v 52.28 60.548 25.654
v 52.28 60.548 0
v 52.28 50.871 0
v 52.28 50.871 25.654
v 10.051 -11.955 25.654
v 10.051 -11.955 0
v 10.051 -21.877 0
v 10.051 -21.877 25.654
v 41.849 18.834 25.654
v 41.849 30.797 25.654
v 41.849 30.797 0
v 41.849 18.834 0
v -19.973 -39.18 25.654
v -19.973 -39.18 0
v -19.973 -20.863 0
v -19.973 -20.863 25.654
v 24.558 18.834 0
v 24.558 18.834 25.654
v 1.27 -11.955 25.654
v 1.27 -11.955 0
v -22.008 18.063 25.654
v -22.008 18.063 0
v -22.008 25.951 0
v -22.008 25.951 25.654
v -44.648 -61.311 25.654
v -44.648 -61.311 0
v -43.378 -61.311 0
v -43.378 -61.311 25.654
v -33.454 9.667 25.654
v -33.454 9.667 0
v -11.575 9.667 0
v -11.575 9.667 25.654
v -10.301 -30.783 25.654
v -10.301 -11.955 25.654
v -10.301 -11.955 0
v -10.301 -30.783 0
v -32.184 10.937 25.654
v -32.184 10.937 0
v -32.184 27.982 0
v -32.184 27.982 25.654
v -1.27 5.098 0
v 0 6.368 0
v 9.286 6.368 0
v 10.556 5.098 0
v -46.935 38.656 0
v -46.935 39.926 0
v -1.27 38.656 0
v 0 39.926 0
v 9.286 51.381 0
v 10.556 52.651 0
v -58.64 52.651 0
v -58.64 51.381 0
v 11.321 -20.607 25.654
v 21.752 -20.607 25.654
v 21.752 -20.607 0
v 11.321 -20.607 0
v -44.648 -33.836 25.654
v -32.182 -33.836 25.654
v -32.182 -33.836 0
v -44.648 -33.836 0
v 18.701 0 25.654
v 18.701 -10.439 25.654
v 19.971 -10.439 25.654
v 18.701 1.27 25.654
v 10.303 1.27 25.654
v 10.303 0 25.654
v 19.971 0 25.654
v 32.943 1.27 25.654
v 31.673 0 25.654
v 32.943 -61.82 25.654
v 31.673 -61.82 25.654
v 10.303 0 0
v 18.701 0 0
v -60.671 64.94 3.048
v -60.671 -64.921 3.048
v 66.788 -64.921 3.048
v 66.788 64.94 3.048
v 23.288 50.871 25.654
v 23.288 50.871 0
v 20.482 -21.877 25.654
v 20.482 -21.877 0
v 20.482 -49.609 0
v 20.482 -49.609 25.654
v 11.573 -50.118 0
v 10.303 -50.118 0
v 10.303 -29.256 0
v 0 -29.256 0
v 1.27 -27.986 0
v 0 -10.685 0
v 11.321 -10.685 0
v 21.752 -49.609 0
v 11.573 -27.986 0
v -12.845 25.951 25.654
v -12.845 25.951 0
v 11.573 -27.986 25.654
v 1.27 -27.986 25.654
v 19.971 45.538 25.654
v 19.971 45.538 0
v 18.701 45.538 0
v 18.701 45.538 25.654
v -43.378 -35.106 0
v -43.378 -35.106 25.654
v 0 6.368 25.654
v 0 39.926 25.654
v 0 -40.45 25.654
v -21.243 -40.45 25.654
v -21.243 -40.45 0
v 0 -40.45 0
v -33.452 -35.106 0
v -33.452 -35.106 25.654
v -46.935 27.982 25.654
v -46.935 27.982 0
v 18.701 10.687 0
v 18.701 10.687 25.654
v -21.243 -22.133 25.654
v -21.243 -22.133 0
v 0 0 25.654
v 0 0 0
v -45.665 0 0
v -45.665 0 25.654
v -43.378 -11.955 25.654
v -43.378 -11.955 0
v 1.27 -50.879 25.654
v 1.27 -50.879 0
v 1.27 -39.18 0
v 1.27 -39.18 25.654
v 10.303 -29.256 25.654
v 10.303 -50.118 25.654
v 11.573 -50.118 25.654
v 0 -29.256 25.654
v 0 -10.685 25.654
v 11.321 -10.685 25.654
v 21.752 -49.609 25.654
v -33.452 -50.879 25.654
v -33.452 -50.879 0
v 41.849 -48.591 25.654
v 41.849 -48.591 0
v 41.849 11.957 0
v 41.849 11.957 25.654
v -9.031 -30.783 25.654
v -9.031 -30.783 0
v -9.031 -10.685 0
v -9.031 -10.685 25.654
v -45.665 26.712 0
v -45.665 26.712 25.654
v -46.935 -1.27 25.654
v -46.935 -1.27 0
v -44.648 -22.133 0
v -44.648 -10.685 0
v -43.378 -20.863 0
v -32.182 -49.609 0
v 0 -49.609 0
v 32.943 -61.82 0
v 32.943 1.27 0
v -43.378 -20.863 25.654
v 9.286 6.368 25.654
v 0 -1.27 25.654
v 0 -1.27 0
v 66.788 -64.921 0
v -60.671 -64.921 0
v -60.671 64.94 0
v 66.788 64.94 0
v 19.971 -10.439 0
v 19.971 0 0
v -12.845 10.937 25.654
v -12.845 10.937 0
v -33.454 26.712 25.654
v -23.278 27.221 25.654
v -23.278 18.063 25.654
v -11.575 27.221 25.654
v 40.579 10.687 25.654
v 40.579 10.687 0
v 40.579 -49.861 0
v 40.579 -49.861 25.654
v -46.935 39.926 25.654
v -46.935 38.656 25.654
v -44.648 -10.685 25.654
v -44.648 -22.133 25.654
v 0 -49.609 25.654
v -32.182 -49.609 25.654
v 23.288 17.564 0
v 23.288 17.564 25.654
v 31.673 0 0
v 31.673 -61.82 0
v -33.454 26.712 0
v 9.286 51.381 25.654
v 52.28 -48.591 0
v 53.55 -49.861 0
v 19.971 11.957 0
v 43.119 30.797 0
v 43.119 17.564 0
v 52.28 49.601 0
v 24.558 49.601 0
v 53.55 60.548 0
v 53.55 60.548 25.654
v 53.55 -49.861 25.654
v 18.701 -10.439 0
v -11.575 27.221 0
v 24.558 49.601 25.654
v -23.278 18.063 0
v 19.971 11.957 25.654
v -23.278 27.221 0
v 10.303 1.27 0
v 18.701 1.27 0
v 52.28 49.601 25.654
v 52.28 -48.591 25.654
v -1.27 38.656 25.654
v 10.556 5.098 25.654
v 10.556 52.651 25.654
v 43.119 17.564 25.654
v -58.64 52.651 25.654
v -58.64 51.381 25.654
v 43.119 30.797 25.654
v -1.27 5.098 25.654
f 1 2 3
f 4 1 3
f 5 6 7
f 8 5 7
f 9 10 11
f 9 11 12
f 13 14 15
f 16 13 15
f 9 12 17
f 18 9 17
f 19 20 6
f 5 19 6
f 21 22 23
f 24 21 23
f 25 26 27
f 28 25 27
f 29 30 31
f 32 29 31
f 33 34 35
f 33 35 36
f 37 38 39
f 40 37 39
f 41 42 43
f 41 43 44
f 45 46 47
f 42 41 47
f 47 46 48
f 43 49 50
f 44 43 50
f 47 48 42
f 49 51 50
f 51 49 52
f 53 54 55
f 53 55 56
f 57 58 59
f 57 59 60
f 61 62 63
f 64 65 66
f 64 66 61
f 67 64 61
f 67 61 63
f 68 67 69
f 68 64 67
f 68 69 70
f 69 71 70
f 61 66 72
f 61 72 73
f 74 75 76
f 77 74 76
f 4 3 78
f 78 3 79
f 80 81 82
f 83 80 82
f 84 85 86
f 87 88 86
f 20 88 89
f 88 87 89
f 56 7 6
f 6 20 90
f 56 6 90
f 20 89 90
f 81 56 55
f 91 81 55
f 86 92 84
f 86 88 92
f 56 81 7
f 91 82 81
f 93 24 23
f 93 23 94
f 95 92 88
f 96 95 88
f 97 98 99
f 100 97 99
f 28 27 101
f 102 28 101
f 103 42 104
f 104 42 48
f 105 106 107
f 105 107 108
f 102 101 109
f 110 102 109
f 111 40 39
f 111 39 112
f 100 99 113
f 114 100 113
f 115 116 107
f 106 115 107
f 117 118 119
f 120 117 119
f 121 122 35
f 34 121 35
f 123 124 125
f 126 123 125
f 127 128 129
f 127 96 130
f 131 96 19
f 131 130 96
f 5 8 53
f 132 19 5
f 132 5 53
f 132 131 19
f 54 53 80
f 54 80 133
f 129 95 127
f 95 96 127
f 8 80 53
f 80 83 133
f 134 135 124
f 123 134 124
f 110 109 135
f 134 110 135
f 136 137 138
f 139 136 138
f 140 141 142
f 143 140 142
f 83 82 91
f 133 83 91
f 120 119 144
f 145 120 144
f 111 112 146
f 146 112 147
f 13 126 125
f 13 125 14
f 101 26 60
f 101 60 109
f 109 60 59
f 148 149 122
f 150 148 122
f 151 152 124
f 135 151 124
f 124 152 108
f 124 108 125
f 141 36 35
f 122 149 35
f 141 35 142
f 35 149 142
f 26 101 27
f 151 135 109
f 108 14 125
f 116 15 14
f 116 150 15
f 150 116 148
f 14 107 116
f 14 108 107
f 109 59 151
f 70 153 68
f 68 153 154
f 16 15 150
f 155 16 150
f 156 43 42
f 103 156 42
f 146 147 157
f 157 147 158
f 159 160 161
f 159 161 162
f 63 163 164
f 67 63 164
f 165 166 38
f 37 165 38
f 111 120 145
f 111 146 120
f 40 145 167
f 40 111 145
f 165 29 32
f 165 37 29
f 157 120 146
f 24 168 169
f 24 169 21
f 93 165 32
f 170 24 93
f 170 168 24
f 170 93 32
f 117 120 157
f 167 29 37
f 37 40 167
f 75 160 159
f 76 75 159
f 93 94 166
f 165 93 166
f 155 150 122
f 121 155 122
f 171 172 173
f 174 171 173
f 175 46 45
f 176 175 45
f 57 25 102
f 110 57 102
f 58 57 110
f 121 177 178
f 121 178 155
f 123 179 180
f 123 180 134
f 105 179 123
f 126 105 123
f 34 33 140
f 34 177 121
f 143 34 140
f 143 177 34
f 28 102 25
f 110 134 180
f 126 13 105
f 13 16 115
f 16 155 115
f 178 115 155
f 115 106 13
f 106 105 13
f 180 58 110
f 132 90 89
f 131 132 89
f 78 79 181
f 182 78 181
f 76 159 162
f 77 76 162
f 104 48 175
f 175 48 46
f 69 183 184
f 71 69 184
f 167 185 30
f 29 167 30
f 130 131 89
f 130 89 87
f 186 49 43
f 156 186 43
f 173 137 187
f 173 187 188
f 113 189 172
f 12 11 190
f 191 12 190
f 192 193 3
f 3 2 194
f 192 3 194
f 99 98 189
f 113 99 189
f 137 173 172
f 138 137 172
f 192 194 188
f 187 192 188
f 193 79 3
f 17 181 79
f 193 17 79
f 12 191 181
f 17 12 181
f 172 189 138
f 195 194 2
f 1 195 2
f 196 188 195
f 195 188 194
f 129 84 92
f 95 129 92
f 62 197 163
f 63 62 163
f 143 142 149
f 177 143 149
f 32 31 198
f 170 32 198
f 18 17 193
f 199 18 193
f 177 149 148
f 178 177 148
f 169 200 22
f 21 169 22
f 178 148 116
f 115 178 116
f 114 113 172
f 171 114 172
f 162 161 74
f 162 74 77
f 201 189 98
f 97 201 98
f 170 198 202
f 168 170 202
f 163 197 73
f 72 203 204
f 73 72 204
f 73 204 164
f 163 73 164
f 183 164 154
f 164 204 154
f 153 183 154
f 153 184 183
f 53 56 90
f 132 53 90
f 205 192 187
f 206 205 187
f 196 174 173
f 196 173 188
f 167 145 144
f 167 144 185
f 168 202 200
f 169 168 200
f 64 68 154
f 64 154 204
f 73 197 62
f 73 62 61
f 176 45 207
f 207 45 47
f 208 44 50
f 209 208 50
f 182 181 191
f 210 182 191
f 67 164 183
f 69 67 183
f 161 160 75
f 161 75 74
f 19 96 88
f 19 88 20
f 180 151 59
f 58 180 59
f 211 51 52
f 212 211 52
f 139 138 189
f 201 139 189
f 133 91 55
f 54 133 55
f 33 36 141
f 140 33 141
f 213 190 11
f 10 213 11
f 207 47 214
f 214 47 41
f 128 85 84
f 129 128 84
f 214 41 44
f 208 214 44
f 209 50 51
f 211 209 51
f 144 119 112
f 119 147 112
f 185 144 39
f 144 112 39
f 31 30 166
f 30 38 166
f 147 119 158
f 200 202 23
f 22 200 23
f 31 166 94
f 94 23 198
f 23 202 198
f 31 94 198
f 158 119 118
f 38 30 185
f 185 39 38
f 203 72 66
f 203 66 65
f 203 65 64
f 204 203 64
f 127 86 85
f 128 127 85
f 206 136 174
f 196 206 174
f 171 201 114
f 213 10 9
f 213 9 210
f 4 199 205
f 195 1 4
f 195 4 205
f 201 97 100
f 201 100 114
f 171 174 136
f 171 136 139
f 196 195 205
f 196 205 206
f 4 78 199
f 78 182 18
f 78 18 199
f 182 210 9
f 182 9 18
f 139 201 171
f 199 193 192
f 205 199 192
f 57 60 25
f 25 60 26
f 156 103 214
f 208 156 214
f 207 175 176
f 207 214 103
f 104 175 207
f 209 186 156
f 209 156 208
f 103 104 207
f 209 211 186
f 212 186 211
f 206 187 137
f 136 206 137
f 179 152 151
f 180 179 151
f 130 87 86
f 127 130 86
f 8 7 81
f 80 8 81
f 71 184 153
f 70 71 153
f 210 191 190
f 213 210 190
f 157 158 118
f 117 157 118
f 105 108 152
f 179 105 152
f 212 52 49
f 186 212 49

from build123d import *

# Parameters (mm, degrees)
F1_DEPTH = 25.654
F0_W     = 1.2699998915
F0_H     = 10.4394
F0_W_2   = 8.3973463625
F0_H_2   = 1.27
F2_W     = 127.459269017
F2_H     = 129.8603862524
F3_DEPTH = 3.048


# Not quite as in the source:
# - ends of sketch curves that miss each other by under 0.0002 mm in the source are joined
# - the program builds the solid bodies; features that only make, move or delete a surface that nothing else refers to are left out


with BuildPart() as f1:
    # F0 (on Top) → F1 (new body)
    with BuildSketch(Plane.XY):
        Polygon((-44.6478687227, -33.835709095), (-44.6478687227, -61.3113231957), (-43.3778688312, -61.3113231957), (-43.3778688312, -35.1057089865), (-33.4520824254, -35.1057089865), (-33.4520824254, -50.8787445724), (1.2699998915, -50.8787445724), (1.2699998915, -39.1802079976), (-19.9727192521, -39.1802079976), (-19.9727192521, -20.8631325513), (-43.3778688312, -20.8631325513), (-43.3778688312, -11.9549604133), (-10.3013357148, -11.9549604133), (-10.3013357148, -30.7828616351), (-9.0313358232, -30.7828616351), (-9.0313358232, -10.6849605218), (-44.6478687227, -10.6849605218), (-44.6478687227, -22.1331324428), (-21.2427191436, -22.1331324428), (-21.2427191436, -40.4502078891), (0, -40.4502078891), (0, -49.6087446809), (-32.1820825338, -49.6087446809), (-32.1820825338, -33.835709095), align=None)
    extrude(amount=F1_DEPTH)


with BuildPart() as f1b:
    # F0 (on Top) → F1, piece 2 (new body)
    with BuildSketch(Plane.XY):
        Polygon((0, -1.2699998915), (0, 0), (-45.6654839218, 0), (-45.6654839218, 26.7124027014), (-33.4541015327, 26.7124027014), (-33.4541015327, 9.6673453227), (-11.575373821, 9.6673453227), (-11.575373821, 27.2212084383), (-23.2779495418, 27.2212084383), (-23.2779495418, 18.0626716465), (-22.0079496503, 18.0626716465), (-22.0079496503, 25.9512085468), (-12.8453737125, 25.9512085468), (-12.8453737125, 10.9373452142), (-32.1841016412, 10.9373452142), (-32.1841016412, 27.9824025929), (-46.9354838133, 27.9824025929), (-46.9354838133, -1.2699998915), align=None)
    extrude(amount=F1_DEPTH)


with BuildPart() as f1c:
    # F0 (on Top) → F1, piece 3 (new body)
    with BuildSketch(Plane.XY):
        Polygon((0, 6.3681719211), (0, 39.9264097214), (-46.9354838133, 39.9264097214), (-46.9354838133, 38.6564097214), (-1.27, 38.6564097214), (-1.27, 5.0981719211), (10.555739623, 5.0981719211), (10.555739623, 52.6514952838), (-46.670460377, 52.6514952838), (-58.6400814354, 52.6514952838), (-58.6400814354, 52.2722989818), (-58.6400814354, 51.3814952838), (-46.670460377, 51.3814952838), (9.285739623, 51.3814952838), (9.285739623, 6.3681719211), align=None)
    extrude(amount=F1_DEPTH)


with BuildPart() as f1d:
    # F0 (on Top) → F1, piece 4 (new body)
    with BuildSketch(Plane.XY):
        Polygon((31.6732786596, -10.4394), (31.6732786596, -49.6087446809), (31.6732786596, -61.82012707), (32.9432785511, -61.82012707), (32.9432785511, -49.6087446809), (32.9432785511, -10.4394), (32.9432785511, 1.2699998915), (19.9707001448, 1.2699998915), (18.7007002532, 1.2699998915), (18.7007002532, 0), (19.9707001448, 0), (31.6732786596, 0), align=None)
        with Locations((19.335700199, -5.2197)):
            Rectangle(F0_W, F0_H)
        with Locations((14.502027072, 0.635)):
            Rectangle(F0_W_2, F0_H_2)
    extrude(amount=F1_DEPTH)


with BuildPart() as f1e:
    # F0 (on Top) → F1, piece 5 (new body)
    with BuildSketch(Plane.XY):
        Polygon((10.3033538908, -29.2564388365), (10.3033538908, -50.1175522804), (11.5733537823, -50.1175522804), (11.5733537823, -27.9864389449), (1.2699998915, -27.9864389449), (1.2699998915, -11.9549604133), (10.050971061, -11.9549604133), (10.050971061, -21.8767095357), (20.481524989, -21.8767095357), (20.481524989, -49.6087446809), (21.7515248805, -49.6087446809), (21.7515248805, -20.6067096442), (11.3209709525, -20.6067096442), (11.3209709525, -10.6849605218), (0, -10.6849605218), (0, -29.2564388365), align=None)
    extrude(amount=F1_DEPTH)


with BuildPart() as f1f:
    # F0 (on Top) → F1, piece 6 (new body)
    with BuildSketch(Plane.XY):
        Polygon((19.9707001448, 11.9569795206), (19.9707001448, 45.5382876098), (18.7007002532, 45.5382876098), (18.7007002532, 10.6869796291), (40.5794270337, 10.6869796291), (40.5794270337, -49.8611293733), (53.5499863327, -49.8611293733), (53.5499863327, 44.5206686854), (53.5499863327, 60.5481117964), (52.2799864411, 60.5481117964), (52.2799864411, 50.8706686854), (52.2799864411, 49.6006686854), (52.2799864411, -48.5911294818), (41.8494269252, -48.5911294818), (41.8494269252, 11.9569795206), align=None)
        Polygon((24.5580426735, 49.6006686854), (52.2799864411, 49.6006686854), (52.2799864411, 50.8706686854), (23.2880426735, 50.8706686854), (23.2880426735, 17.5639590412), (43.1194269252, 17.5639590412), (43.1194269252, 30.7973590412), (41.8494269252, 30.7973590412), (41.8494269252, 18.8339590412), (24.5580426735, 18.8339590412), align=None)
    extrude(amount=F1_DEPTH)


with BuildPart() as f3:
    # F2 (on Top) → F3 (new body)
    with BuildSketch(Plane.XY):
        with Locations((3.0588377267, 0.0096485019)):
            Rectangle(F2_W, F2_H)
    extrude(amount=F3_DEPTH)


solid = Compound([f1.part, f1b.part, f1c.part, f1d.part, f1e.part, f1f.part, f3.part])
